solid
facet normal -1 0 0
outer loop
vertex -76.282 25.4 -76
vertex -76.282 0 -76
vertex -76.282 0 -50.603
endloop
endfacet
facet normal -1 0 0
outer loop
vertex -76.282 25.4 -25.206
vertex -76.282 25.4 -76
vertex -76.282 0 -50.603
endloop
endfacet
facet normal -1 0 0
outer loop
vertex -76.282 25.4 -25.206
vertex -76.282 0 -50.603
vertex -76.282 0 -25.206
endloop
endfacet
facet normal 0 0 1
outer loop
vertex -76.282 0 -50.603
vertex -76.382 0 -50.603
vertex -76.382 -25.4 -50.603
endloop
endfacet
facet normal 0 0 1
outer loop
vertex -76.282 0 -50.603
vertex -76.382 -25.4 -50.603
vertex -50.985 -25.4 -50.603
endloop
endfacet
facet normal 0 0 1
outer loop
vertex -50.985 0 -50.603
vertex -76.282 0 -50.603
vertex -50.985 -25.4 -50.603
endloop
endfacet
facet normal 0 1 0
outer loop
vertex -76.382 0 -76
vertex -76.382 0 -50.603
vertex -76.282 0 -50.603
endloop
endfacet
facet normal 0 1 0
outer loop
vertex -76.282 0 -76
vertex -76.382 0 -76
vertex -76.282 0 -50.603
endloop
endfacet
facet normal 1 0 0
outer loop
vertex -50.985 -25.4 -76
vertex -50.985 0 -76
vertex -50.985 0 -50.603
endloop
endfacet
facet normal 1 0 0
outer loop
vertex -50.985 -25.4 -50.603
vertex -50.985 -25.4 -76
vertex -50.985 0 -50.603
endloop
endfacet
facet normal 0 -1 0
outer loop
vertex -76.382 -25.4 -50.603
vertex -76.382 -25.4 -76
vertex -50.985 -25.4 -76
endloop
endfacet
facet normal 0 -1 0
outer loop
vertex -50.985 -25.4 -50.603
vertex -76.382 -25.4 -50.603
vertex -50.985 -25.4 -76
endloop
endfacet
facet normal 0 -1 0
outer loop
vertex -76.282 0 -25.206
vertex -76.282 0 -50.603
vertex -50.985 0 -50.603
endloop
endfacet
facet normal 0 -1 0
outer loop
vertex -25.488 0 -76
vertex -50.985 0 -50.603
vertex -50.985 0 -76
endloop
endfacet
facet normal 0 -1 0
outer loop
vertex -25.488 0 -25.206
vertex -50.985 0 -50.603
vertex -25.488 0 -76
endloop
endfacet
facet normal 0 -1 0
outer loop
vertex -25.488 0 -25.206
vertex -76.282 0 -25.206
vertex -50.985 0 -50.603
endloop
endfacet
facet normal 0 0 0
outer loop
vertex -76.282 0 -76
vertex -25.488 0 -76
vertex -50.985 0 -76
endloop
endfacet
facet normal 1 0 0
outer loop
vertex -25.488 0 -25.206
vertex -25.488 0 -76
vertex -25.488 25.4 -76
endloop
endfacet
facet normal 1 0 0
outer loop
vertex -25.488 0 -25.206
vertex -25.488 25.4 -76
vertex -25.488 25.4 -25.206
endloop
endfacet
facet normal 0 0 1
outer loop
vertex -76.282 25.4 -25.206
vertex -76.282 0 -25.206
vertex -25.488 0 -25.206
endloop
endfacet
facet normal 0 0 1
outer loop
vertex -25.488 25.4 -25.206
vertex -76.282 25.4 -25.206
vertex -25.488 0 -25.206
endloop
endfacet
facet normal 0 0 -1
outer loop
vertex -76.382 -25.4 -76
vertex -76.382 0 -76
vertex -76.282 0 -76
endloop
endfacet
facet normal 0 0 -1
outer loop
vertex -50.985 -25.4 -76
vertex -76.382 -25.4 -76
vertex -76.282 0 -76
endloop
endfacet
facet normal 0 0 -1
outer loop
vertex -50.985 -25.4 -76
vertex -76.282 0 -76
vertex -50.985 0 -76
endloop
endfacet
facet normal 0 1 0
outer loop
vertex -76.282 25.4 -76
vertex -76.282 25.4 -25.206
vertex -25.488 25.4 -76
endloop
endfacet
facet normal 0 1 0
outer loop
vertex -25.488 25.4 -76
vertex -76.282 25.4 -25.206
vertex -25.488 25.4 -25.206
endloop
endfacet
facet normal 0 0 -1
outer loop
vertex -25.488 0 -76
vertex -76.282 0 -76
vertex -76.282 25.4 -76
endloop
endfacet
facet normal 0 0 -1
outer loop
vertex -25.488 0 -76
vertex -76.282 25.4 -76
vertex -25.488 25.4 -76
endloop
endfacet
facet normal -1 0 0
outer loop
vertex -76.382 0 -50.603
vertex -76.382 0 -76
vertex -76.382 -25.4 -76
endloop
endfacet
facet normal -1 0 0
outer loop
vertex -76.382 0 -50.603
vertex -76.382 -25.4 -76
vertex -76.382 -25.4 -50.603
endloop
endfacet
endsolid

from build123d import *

# Parameters (mm, degrees)
F1_W     = 50.79394
F1_H     = 50.793938
F2_DEPTH = 25.4
F0_W     = 25.396969
F0_H     = 25.396969
F3_DEPTH = 25.4


with BuildPart() as f2:
    # F1 (on Front) → F2 (new body)
    with BuildSketch(Plane.XZ):
        with Locations((-50.884868, -50.602984)):
            Rectangle(F1_W, F1_H)
    extrude(amount=-F2_DEPTH)

    # F0 (on Front) → F3 (join)
    with BuildSketch(Plane.XZ):
        with Locations((-63.683377, -63.301468)):
            Rectangle(F0_W, F0_H)
    extrude(amount=F3_DEPTH)


solid = f2.part
